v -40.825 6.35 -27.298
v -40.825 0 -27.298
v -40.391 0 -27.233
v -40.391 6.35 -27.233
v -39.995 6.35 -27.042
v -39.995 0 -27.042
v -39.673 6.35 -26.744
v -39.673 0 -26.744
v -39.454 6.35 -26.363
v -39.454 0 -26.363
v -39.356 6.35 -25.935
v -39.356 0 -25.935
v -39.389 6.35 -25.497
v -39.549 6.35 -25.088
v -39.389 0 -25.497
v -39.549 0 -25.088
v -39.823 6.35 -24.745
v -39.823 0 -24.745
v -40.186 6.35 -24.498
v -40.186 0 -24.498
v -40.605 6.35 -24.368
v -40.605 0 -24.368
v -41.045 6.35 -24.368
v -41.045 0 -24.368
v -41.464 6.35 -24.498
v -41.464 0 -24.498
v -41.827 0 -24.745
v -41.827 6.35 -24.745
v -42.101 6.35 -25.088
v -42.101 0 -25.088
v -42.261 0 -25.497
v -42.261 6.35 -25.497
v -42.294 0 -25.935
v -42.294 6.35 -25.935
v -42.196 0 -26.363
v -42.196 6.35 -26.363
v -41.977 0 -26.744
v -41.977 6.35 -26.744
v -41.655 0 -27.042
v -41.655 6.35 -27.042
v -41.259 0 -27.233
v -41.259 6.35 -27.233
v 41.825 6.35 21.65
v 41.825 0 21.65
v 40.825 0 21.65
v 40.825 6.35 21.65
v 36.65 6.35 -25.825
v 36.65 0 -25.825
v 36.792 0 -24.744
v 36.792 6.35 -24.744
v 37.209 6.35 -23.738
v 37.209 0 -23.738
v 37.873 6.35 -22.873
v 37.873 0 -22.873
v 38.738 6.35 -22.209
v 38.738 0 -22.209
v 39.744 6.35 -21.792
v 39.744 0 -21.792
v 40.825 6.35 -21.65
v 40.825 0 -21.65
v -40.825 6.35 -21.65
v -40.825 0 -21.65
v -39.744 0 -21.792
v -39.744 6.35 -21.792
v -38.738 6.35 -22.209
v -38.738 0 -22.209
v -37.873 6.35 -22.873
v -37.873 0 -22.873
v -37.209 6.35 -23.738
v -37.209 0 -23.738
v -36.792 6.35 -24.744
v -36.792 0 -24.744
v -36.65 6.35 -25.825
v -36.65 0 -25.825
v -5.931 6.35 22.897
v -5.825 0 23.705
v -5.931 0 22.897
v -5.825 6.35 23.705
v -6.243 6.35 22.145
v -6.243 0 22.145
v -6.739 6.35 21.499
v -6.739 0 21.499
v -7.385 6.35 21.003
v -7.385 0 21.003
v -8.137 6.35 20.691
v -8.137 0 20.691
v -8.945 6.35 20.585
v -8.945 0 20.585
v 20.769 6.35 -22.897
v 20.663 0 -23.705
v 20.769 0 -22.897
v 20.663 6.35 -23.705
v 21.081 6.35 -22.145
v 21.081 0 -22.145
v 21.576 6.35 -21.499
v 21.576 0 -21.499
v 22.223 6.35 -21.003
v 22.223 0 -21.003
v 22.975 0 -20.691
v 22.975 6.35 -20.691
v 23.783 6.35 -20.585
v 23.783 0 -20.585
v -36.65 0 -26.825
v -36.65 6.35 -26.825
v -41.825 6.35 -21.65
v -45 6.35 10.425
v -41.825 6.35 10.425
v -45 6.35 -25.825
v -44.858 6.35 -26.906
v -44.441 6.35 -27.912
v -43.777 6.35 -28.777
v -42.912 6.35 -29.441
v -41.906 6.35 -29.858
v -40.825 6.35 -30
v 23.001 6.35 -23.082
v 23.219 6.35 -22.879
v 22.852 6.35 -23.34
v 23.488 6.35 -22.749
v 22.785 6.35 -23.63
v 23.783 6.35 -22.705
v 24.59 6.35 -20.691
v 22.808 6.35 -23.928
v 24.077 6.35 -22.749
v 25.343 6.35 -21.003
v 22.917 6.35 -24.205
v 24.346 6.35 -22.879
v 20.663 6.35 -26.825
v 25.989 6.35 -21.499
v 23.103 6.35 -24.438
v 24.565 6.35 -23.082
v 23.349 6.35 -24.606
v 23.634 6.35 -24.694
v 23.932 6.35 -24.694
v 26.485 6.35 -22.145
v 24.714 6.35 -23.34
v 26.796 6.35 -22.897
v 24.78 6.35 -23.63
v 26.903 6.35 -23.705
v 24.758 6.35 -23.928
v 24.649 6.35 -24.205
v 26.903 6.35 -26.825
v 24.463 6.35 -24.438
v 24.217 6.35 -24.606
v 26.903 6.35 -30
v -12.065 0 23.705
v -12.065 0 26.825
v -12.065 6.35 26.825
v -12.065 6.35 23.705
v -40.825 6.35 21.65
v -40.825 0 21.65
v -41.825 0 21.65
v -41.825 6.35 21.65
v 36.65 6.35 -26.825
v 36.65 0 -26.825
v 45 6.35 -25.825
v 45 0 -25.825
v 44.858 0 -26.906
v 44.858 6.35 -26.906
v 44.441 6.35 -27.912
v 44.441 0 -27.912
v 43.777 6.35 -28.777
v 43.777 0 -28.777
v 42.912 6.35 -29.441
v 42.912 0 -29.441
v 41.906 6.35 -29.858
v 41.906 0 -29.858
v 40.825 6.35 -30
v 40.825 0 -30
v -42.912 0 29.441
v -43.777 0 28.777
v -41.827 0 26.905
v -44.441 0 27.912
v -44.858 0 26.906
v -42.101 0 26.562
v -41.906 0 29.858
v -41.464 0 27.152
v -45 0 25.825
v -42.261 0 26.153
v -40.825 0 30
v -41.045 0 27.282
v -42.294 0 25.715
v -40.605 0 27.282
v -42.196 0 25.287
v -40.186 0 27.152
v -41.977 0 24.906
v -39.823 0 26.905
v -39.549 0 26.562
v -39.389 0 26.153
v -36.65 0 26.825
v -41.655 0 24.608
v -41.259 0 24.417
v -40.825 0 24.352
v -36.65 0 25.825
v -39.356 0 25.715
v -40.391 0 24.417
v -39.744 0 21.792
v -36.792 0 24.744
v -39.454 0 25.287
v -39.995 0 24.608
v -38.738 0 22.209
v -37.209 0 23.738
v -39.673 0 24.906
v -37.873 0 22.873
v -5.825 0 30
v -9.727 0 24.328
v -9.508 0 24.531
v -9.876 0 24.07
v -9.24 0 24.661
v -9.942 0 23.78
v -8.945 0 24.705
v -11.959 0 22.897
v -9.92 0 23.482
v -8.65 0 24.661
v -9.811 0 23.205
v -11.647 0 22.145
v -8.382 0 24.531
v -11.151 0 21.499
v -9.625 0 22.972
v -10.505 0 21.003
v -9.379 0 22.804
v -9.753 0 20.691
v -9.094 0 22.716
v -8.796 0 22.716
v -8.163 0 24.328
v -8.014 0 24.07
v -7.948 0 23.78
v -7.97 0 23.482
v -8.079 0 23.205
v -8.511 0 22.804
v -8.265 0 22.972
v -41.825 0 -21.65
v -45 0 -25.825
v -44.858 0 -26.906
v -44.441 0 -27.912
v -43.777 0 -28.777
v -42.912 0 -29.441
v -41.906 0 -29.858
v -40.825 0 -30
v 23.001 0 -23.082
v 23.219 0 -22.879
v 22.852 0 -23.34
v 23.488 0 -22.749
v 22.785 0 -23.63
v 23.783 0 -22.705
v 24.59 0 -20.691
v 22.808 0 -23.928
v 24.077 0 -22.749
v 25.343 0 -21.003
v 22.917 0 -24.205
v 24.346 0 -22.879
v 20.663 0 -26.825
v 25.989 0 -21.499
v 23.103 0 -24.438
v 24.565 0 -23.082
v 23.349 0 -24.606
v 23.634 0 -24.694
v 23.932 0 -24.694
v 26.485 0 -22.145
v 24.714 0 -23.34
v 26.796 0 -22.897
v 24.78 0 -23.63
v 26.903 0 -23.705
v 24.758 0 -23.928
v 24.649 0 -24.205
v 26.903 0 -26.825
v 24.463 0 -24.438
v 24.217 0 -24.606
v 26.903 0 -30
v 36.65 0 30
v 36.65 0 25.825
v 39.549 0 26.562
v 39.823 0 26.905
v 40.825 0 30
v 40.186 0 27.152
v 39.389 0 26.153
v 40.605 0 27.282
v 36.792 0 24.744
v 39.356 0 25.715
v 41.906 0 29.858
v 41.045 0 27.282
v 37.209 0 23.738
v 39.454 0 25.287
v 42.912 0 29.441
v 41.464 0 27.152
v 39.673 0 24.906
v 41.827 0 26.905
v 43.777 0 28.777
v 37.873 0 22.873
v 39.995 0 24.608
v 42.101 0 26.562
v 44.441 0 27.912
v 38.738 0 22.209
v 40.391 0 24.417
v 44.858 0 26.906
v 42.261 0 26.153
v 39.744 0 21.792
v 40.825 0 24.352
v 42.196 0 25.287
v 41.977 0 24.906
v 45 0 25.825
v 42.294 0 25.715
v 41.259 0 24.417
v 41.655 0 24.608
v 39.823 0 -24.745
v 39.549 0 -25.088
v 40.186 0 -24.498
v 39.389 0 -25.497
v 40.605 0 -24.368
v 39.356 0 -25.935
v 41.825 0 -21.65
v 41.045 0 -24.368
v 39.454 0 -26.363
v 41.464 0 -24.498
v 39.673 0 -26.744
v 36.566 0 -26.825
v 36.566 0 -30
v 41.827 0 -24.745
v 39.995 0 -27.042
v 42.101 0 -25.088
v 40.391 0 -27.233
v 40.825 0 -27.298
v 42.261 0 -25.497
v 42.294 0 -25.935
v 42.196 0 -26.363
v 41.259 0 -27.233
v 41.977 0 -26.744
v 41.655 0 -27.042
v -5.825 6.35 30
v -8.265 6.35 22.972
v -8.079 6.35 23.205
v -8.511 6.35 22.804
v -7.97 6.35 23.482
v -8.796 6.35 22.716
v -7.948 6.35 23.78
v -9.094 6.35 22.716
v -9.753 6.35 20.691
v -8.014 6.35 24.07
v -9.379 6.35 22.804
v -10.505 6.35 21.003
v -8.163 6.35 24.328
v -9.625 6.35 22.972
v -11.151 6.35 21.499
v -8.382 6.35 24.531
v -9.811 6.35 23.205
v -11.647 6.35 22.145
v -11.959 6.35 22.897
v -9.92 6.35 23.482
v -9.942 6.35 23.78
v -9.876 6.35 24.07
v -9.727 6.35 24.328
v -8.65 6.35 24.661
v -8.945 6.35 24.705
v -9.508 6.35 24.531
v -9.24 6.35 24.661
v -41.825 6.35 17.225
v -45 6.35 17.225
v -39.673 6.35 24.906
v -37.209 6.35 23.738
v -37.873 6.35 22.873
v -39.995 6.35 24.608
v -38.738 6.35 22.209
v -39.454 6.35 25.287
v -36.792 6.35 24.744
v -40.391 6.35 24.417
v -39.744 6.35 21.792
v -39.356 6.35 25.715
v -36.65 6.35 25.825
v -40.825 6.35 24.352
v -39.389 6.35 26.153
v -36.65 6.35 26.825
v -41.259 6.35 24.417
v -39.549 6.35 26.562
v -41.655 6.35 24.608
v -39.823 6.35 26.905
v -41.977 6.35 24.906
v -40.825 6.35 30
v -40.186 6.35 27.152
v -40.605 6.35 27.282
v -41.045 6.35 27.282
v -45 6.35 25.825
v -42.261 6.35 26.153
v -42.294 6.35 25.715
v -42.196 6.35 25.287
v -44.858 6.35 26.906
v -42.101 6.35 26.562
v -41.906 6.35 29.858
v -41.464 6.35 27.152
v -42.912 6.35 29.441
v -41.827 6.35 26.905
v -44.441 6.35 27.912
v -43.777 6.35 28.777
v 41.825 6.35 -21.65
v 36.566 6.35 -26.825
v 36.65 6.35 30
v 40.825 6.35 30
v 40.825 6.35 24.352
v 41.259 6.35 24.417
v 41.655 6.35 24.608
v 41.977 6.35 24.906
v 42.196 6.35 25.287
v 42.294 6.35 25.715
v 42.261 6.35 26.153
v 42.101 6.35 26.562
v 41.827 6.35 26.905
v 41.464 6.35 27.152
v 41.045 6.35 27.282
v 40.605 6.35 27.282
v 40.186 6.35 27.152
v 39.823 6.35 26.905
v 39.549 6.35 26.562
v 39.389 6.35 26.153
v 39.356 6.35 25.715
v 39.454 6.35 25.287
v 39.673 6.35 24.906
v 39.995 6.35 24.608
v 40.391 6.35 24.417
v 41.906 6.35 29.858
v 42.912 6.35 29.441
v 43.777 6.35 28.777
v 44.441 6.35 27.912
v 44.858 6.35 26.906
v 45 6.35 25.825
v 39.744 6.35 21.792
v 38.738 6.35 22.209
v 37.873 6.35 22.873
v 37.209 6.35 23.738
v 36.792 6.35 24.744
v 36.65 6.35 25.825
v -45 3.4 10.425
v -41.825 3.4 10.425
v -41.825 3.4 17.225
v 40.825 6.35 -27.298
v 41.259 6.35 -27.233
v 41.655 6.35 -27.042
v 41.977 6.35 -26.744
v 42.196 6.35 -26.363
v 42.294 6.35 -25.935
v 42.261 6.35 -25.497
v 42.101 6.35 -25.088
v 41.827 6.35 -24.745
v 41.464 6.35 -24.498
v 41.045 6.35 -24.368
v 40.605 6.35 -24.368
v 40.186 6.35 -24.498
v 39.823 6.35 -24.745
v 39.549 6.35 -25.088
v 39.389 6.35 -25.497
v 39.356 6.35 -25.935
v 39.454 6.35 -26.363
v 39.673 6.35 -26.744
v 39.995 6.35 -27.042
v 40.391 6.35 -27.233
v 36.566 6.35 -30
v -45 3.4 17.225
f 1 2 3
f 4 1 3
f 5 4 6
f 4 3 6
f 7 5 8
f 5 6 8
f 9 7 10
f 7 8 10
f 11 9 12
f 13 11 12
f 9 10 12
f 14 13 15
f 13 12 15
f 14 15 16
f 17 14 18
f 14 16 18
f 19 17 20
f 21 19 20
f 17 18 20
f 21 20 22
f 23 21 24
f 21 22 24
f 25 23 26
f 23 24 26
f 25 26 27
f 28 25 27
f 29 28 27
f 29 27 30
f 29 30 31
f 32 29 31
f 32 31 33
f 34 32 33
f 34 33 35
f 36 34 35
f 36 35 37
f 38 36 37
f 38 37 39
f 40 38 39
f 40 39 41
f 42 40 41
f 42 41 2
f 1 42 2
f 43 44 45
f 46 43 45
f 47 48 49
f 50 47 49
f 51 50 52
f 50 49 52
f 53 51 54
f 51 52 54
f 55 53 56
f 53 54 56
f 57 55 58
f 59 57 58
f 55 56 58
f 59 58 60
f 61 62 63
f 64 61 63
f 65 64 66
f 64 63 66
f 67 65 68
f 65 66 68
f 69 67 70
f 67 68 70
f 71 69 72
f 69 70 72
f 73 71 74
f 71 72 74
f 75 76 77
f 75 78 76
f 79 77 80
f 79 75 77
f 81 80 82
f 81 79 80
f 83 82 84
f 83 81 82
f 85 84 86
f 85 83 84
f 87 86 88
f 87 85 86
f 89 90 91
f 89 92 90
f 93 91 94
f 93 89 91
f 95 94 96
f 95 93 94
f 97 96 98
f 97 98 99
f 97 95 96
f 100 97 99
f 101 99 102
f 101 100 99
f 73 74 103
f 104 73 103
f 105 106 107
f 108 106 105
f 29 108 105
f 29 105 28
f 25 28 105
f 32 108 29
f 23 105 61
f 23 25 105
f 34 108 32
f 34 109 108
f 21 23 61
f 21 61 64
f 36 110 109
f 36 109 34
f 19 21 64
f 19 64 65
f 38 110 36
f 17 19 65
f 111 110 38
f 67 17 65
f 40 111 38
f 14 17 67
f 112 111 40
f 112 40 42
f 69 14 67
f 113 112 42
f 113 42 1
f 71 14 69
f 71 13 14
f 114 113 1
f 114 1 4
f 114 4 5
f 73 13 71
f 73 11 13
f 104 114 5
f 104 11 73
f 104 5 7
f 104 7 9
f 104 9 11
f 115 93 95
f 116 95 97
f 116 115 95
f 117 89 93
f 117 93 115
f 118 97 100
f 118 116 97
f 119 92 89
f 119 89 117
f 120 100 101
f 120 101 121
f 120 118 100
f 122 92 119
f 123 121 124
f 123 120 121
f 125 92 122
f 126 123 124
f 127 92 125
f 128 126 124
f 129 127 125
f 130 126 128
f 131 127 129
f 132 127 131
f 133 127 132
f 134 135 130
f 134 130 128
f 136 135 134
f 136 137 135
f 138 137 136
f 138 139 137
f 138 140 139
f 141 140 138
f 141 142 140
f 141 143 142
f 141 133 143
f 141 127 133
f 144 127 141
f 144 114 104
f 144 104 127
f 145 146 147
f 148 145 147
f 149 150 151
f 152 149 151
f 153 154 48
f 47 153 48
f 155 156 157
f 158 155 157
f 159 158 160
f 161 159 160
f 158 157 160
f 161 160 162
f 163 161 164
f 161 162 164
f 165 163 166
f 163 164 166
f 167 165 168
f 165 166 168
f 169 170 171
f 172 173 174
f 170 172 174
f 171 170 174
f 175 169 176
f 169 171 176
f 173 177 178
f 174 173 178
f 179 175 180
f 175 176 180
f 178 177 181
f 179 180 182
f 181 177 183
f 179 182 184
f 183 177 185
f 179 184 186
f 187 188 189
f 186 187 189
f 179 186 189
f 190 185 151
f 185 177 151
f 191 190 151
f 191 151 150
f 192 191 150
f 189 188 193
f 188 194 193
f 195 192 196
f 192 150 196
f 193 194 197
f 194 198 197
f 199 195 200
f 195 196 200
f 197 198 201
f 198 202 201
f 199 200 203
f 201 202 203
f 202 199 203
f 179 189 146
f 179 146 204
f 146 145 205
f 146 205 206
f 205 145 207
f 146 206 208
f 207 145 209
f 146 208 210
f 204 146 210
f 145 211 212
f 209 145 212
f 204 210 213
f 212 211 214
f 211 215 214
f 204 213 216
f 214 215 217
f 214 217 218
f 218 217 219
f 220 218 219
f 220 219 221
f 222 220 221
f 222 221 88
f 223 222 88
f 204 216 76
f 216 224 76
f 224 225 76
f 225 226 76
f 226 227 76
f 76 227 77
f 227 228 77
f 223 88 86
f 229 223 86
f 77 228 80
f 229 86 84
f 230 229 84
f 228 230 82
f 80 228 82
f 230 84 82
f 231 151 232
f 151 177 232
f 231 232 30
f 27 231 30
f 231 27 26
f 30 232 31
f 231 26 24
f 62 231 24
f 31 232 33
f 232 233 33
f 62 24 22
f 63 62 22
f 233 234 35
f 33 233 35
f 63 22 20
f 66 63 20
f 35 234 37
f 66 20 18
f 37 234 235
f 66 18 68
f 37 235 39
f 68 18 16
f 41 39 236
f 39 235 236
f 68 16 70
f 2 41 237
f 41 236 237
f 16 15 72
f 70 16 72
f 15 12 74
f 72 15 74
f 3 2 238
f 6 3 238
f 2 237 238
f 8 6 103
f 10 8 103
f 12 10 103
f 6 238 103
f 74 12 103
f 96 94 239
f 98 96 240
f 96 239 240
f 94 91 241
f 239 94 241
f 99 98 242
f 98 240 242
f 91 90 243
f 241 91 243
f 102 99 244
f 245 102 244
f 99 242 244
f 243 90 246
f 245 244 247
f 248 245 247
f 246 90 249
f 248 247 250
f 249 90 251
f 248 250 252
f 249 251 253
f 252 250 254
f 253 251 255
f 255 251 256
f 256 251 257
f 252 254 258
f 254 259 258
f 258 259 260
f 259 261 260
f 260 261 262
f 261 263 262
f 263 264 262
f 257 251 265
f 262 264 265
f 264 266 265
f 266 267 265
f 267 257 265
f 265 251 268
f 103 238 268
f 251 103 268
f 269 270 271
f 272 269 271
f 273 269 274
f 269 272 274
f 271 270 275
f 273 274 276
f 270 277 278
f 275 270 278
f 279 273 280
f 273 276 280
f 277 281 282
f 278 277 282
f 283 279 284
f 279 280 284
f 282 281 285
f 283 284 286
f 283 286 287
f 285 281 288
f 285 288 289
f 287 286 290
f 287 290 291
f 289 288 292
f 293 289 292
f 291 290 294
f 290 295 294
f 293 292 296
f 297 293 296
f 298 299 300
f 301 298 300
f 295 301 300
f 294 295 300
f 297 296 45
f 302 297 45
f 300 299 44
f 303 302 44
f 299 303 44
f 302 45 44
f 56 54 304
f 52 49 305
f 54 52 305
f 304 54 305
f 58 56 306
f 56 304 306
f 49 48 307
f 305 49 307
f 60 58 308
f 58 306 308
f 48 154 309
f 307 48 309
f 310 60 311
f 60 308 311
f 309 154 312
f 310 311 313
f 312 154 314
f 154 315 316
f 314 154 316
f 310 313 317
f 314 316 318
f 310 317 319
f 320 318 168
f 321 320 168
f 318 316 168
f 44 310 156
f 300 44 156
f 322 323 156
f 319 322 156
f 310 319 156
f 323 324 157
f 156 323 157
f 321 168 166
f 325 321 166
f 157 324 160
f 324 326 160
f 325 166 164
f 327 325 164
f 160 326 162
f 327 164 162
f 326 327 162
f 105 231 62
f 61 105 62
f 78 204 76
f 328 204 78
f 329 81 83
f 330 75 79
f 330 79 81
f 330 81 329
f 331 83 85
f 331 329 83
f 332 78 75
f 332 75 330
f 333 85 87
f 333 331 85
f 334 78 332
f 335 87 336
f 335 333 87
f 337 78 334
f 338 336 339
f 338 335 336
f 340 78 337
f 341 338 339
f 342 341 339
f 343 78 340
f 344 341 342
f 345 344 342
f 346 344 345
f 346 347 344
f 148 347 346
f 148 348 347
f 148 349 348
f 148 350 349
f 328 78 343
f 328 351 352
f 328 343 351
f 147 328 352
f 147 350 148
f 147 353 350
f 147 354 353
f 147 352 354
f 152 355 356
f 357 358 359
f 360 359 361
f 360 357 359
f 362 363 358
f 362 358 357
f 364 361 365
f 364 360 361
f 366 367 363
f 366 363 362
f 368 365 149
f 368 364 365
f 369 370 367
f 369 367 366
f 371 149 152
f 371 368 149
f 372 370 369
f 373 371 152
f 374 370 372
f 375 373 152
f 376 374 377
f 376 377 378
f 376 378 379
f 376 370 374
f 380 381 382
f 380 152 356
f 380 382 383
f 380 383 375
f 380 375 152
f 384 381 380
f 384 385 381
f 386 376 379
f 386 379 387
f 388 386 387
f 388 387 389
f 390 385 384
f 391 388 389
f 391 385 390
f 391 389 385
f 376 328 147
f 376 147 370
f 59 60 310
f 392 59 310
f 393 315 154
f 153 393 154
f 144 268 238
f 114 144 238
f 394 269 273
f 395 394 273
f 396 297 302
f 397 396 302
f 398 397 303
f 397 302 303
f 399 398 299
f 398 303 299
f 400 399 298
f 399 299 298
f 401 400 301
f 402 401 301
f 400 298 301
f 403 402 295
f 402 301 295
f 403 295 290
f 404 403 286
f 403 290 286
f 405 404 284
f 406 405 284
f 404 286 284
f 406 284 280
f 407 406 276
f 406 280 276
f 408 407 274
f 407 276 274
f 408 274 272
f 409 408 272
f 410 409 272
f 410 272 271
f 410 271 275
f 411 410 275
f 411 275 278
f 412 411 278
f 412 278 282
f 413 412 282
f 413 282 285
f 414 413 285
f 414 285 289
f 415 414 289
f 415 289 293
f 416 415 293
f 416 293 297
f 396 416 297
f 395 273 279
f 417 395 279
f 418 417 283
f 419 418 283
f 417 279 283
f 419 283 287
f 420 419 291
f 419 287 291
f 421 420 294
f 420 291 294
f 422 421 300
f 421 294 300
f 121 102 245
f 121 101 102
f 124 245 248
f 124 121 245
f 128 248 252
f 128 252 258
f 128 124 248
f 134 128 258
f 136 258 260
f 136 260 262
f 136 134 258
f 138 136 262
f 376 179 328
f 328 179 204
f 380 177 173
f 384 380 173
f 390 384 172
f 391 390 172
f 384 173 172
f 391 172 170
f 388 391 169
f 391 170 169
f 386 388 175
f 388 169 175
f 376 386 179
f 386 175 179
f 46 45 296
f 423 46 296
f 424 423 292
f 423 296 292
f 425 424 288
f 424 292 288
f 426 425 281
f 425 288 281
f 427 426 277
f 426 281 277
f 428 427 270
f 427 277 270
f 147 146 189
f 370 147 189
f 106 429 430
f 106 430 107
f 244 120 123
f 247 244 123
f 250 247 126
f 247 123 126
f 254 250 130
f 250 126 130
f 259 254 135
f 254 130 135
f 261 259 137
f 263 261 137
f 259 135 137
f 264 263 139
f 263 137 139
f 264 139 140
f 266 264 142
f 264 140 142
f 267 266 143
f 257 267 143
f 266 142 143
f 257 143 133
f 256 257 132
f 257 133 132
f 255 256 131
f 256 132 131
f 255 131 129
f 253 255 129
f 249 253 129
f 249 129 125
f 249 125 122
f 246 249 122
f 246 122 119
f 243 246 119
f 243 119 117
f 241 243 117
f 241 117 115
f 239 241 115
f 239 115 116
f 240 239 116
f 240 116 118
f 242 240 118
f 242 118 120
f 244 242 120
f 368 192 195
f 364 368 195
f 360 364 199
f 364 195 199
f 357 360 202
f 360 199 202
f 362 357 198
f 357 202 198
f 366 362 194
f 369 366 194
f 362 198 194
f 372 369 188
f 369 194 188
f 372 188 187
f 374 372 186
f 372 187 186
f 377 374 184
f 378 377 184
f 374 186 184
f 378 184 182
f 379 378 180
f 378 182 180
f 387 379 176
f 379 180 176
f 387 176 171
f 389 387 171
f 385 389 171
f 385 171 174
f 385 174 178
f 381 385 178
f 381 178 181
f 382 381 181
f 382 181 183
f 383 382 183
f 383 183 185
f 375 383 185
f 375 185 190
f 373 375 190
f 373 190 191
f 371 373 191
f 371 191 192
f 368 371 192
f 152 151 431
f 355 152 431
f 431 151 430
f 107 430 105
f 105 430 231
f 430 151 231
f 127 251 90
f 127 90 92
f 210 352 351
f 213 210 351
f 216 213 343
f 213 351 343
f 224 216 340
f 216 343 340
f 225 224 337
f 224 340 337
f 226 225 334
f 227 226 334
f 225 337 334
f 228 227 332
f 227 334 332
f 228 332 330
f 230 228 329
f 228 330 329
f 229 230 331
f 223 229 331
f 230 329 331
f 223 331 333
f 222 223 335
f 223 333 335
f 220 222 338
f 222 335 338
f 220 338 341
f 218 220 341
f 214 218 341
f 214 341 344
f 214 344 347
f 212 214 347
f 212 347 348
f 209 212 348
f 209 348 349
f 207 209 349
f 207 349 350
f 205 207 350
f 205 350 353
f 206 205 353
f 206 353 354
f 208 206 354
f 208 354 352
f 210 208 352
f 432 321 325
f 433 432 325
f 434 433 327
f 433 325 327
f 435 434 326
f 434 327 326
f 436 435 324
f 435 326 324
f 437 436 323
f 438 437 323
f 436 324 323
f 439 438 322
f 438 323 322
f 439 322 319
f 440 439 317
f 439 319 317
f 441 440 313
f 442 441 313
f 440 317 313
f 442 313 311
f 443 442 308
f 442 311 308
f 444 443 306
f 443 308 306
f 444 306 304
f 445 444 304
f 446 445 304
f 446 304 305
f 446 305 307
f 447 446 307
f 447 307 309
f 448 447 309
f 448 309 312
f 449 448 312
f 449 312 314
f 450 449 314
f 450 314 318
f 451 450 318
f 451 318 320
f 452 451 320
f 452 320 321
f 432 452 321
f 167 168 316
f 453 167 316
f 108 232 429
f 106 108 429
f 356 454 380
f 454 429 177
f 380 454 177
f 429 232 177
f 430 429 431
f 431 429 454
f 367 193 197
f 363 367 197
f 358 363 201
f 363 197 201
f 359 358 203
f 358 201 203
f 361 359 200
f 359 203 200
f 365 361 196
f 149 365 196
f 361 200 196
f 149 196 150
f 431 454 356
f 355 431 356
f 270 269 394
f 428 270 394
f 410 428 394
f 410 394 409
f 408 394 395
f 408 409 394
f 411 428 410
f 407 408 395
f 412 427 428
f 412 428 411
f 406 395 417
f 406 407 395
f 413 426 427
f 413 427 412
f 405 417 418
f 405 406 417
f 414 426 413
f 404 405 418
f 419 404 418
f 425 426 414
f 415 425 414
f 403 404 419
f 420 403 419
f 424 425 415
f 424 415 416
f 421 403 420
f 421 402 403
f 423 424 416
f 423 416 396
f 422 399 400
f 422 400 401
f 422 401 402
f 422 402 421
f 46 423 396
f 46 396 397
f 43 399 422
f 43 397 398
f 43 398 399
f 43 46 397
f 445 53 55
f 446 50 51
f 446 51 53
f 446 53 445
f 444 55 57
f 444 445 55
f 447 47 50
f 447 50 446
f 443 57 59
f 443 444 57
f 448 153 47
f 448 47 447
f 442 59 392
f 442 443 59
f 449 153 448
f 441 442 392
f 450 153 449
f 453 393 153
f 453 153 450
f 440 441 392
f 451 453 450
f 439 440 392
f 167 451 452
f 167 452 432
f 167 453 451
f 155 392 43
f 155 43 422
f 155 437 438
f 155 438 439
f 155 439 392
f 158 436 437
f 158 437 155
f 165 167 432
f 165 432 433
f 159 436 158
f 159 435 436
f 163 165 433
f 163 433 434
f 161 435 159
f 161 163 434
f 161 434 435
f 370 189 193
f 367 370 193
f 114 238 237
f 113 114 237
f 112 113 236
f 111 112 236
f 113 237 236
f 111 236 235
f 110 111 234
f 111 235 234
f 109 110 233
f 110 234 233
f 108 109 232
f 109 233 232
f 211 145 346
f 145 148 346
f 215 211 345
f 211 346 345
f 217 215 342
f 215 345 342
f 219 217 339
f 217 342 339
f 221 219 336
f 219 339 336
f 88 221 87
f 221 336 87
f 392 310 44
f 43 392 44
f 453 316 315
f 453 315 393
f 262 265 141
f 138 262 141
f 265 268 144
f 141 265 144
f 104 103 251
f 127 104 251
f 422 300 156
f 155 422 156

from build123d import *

# Parameters (mm, degrees)
BOSS_EXTRUDE3_DEPTH = 6.35
SKETCH3_W           = 9.663283239
SKETCH3_H           = 6.35
CUT_EXTRUDE1_DEPTH  = 3.175
SKETCH4_W           = 42.475
SKETCH4_H           = 6.35
CUT_EXTRUDE2_DEPTH  = 8.35
SKETCH5_W           = 6.8
SKETCH5_H           = 5.9
CUT_EXTRUDE3_DEPTH  = 3.175
SKETCH7_R           = 1.4732
CUT_EXTRUDE4_DEPTH  = 10
SKETCH10_W          = 6.24
SKETCH10_H          = 6.35
BOSS_EXTRUDE4_DEPTH = 6.24
SKETCH11_W          = 6.24
SKETCH11_H          = 6.35
BOSS_EXTRUDE5_DEPTH = 6.24
SKETCH12_R          = 1
CUT_EXTRUDE5_DEPTH  = 55.454774814
SKETCH13_R          = 1
CUT_EXTRUDE6_DEPTH  = 55.454774814
FILLET1_R           = 3.12


with BuildPart() as part:
    # Sketch2 → Boss-Extrude3 (new body)
    with BuildSketch(Plane(origin=(0, 0, 0), x_dir=(1, 0, 0), z_dir=(0, 1, 0))):
        with BuildLine():
            Line((-45, 25.825), (-45, -25.825))
            ThreePointArc((-45, -25.825), (-43.777170811, -28.777170811), (-40.825, -30))
            Line((-40.825, -30), (40.825, -30))
            ThreePointArc((40.825, -30), (43.777170811, -28.777170811), (45, -25.825))
            Line((45, -25.825), (45, 25.825))
            ThreePointArc((45, 25.825), (43.777170811, 28.777170811), (40.825, 30))
            Line((40.825, 30), (-40.825, 30))
            ThreePointArc((-40.825, 30), (-43.777170811, 28.777170811), (-45, 25.825))
        make_face()
        with BuildLine():
            Line((40.825, 21.65), (41.825, 21.65))
            Line((41.825, 21.65), (41.825, -21.65))
            Line((41.825, -21.65), (40.825, -21.65))
            ThreePointArc((40.825, -21.65), (37.872829189, -22.872829189), (36.65, -25.825))
            Line((36.65, -25.825), (36.65, -26.825))
            Line((36.65, -26.825), (-36.65, -26.825))
            Line((-36.65, -26.825), (-36.65, -25.825))
            ThreePointArc((-36.65, -25.825), (-37.872829189, -22.872829189), (-40.825, -21.65))
            Line((-40.825, -21.65), (-41.825, -21.65))
            Line((-41.825, -21.65), (-41.825, 21.65))
            Line((-41.825, 21.65), (-40.825, 21.65))
            ThreePointArc((-40.825, 21.65), (-37.872829189, 22.872829189), (-36.65, 25.825))
            Line((-36.65, 25.825), (-36.65, 26.825))
            Line((-36.65, 26.825), (36.65, 26.825))
            Line((36.65, 26.825), (36.65, 25.825))
            ThreePointArc((36.65, 25.825), (37.872829189, 22.872829189), (40.825, 21.65))
        make_face(mode=Mode.SUBTRACT)
    extrude(amount=BOSS_EXTRUDE3_DEPTH)

    # Sketch3 → Cut-Extrude1 (cut)
    with BuildSketch(Plane(origin=(0, 0, -30), x_dir=(-1, 0, 0), z_dir=(0, 0, -1))):
        with Locations((-31.734329903, 3.175)):
            Rectangle(SKETCH3_W, SKETCH3_H)
    extrude(amount=-CUT_EXTRUDE1_DEPTH, mode=Mode.SUBTRACT)

    # Sketch4 → Cut-Extrude2 (cut)
    with BuildSketch(Plane.XY.offset(30)):
        with Locations((15.4125, 3.175)):
            Rectangle(SKETCH4_W, SKETCH4_H)
    extrude(amount=-CUT_EXTRUDE2_DEPTH, mode=Mode.SUBTRACT)


with BuildPart() as cut_extrude2_piece_1:
    # of the separate pieces the step leaves, piece 1, a body of its own (cut_extrude2_pieces)
    add(part.part.solids().sort_by_distance((-40.825, 0, 30))[0])

    # Sketch5 → Cut-Extrude3 (cut)
    with BuildSketch(Plane.ZY.offset(45)):
        with Locations((13.825, 6.35)):
            Rectangle(SKETCH5_W, SKETCH5_H)
    extrude(amount=-CUT_EXTRUDE3_DEPTH, mode=Mode.SUBTRACT)


with BuildPart() as cut_extrude2_piece_2:
    # of the separate pieces the step leaves, piece 2, a body of its own (cut_extrude2_pieces)
    add(part.part.solids().sort_by_distance((40.825, 0, -30))[0])


with BuildPart() as cut_extrude4_tool:
    # Sketch7 → Cut-Extrude4 (new body)
    with BuildSketch(Plane.XZ):
        with Locations(Location((-40.825, -25.825, 0), (0, 0, 270))):
            Circle(SKETCH7_R)
        with Locations(Location((-40.825, 25.825, 0), (0, 0, 270))):
            Circle(SKETCH7_R)
        with Locations(Location((40.825, 25.825, 0), (0, 0, 270))):
            Circle(SKETCH7_R)
        with Locations(Location((40.825, -25.825, 0), (0, 0, 270))):
            Circle(SKETCH7_R)
    extrude(amount=-CUT_EXTRUDE4_DEPTH)


with BuildPart() as cut_extrude2_piece_1_1:
    add(cut_extrude2_piece_1.part)

    # Cut-Extrude4: cut by cut_extrude4_tool
    add(cut_extrude4_tool.part, mode=Mode.SUBTRACT)

    # Sketch10 → Boss-Extrude4 (add)
    with BuildSketch(Plane(origin=(0, 0, 26.825), x_dir=(-1, 0, 0), z_dir=(0, 0, -1))):
        with Locations((8.945, 3.175)):
            Rectangle(SKETCH10_W, SKETCH10_H)
    extrude(amount=BOSS_EXTRUDE4_DEPTH)

    # Sketch11 → Boss-Extrude5 (add)
    with BuildSketch(Plane.XY.offset(-26.825)):
        with Locations((23.782688283, 3.175)):
            Rectangle(SKETCH11_W, SKETCH11_H)
    extrude(amount=BOSS_EXTRUDE5_DEPTH)

    # Sketch12 → Cut-Extrude5 (cut, through all)
    with BuildSketch(Plane(origin=(0, 6.35, 0), x_dir=(1, 0, 0), z_dir=(0, 1, 0))):
        with Locations(Location((23.782688283, 23.705, 0), (0, 0, 270))):
            Circle(SKETCH12_R)
    extrude(amount=-CUT_EXTRUDE5_DEPTH, mode=Mode.SUBTRACT)

    # Sketch13 → Cut-Extrude6 (cut, through all)
    with BuildSketch(Plane(origin=(0, 6.35, 0), x_dir=(1, 0, 0), z_dir=(0, 1, 0))):
        with Locations(Location((-8.945, -23.705, 0), (0, 0, 270))):
            Circle(SKETCH13_R)
    extrude(amount=-CUT_EXTRUDE6_DEPTH, mode=Mode.SUBTRACT)

    # Fillet1
    fillet1_edges = [cut_extrude2_piece_1_1.edges().sort_by_distance(p)[0] for p in [
        (26.902688283, 3.175, -20.585),
        (20.662688283, 3.175, -20.585),
        (-5.825, 3.175, 20.585),
        (-12.065, 3.175, 20.585),
    ]]
    fillet(fillet1_edges, radius=FILLET1_R - 0.0001)  # a hair under: the kernel refuses the full size


with BuildPart() as cut_extrude2_piece_2_1:
    add(cut_extrude2_piece_2.part)

    # Cut-Extrude4: cut by cut_extrude4_tool
    add(cut_extrude4_tool.part, mode=Mode.SUBTRACT)


solid = Compound([cut_extrude2_piece_1_1.part, cut_extrude2_piece_2_1.part])
